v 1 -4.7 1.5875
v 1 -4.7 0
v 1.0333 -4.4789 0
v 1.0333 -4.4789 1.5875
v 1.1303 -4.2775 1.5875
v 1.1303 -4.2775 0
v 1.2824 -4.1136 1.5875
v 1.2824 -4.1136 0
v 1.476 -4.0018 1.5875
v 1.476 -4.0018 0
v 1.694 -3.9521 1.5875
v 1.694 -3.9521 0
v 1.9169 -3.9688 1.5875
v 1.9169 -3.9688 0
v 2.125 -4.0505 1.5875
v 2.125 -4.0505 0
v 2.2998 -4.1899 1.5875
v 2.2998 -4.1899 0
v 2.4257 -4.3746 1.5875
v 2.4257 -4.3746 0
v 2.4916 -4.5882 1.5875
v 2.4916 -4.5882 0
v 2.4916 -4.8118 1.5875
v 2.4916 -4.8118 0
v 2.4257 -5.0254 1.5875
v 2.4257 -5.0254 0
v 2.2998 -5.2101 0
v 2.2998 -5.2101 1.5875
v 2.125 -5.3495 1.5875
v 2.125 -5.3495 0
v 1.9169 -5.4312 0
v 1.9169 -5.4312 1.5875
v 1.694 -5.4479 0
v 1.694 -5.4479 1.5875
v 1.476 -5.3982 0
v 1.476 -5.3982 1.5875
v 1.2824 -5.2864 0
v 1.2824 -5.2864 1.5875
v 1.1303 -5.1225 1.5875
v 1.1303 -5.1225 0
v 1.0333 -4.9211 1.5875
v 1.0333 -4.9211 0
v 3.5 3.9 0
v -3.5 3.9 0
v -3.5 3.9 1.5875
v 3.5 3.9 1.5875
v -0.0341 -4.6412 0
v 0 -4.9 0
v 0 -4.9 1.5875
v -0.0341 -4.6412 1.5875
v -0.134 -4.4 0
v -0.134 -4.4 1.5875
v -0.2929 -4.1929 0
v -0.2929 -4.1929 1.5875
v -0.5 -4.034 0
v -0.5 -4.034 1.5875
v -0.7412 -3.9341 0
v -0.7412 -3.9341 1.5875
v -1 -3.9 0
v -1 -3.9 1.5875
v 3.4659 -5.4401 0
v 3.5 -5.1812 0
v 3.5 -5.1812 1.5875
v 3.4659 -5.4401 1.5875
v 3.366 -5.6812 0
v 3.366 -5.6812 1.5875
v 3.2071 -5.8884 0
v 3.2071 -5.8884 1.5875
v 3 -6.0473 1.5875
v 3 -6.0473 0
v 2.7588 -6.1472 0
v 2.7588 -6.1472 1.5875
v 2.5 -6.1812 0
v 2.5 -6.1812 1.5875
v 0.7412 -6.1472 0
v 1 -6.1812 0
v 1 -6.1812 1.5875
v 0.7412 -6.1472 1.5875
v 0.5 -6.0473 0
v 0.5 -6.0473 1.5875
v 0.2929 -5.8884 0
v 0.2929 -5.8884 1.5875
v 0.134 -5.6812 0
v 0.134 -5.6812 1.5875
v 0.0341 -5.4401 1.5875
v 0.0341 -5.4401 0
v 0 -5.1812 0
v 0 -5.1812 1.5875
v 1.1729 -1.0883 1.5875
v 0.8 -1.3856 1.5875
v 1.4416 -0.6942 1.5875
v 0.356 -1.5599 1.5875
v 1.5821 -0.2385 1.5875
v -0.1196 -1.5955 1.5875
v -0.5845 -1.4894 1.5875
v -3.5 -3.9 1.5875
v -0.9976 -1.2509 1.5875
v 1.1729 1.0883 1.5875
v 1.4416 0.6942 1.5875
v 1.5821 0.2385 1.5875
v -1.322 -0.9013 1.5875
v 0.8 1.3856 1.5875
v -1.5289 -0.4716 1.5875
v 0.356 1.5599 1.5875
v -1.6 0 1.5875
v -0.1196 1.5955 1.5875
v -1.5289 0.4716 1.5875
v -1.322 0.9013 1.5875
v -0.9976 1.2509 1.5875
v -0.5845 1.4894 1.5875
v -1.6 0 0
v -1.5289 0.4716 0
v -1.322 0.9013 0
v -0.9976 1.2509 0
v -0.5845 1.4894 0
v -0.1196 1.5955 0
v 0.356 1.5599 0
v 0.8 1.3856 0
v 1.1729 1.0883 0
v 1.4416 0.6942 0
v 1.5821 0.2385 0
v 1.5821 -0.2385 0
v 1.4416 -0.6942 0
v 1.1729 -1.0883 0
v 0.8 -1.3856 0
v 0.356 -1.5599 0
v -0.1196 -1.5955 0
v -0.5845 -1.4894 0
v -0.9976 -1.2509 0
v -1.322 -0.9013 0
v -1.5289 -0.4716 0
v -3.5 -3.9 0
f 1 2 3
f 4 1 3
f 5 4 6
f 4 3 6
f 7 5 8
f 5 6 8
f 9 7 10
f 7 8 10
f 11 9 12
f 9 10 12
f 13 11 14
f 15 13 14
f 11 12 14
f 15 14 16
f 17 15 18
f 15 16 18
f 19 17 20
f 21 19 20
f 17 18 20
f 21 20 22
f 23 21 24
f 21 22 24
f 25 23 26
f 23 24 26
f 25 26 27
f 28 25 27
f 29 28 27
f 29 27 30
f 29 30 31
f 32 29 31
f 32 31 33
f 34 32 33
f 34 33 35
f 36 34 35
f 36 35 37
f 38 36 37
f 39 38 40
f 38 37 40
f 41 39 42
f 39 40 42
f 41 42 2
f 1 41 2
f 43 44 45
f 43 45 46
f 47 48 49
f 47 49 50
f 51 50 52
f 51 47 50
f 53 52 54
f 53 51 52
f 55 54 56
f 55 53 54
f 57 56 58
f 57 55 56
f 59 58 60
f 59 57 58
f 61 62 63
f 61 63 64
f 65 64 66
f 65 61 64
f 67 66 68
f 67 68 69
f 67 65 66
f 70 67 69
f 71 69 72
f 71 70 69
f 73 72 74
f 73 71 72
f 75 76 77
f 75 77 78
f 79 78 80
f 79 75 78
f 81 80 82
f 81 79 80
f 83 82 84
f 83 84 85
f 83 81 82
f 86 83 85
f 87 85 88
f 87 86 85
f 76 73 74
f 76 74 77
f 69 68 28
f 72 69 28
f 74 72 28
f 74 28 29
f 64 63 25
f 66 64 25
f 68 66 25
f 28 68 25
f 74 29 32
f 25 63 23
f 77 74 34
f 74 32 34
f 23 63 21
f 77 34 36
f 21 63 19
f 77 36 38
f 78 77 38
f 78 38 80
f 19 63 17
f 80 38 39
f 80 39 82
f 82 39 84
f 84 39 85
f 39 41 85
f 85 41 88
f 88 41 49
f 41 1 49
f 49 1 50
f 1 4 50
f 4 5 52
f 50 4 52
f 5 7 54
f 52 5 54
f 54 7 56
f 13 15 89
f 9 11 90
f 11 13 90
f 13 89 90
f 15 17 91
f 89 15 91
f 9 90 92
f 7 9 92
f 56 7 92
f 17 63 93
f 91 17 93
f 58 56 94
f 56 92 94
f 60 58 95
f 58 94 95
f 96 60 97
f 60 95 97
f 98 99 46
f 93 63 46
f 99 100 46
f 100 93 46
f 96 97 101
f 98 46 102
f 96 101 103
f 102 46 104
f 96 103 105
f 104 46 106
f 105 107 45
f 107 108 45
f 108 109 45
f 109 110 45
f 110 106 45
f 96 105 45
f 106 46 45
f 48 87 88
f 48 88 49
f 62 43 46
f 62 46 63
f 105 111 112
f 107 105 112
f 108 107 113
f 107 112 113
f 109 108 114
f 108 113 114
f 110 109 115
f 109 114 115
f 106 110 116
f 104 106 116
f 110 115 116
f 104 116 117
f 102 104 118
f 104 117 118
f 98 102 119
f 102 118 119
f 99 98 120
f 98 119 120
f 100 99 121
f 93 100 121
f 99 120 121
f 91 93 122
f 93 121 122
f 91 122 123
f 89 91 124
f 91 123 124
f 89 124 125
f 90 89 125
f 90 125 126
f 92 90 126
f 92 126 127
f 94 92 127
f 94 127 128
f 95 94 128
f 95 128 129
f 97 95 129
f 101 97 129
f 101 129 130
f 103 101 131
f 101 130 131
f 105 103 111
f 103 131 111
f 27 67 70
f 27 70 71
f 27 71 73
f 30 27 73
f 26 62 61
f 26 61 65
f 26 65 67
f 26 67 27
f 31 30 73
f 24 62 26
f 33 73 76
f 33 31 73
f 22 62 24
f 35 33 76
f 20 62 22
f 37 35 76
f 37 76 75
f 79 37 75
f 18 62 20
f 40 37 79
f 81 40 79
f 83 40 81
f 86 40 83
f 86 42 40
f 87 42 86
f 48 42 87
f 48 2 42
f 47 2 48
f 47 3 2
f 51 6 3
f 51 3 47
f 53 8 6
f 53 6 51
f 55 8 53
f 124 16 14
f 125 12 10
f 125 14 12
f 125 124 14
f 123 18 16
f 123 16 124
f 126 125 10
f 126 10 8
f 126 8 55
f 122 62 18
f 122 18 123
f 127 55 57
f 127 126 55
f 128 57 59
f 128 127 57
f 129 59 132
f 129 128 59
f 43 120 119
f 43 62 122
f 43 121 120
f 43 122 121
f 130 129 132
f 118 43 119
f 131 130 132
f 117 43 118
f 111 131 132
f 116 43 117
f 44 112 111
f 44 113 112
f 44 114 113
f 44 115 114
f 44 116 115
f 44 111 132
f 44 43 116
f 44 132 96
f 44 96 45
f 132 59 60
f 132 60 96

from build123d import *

# Parameters (mm, degrees)
SKETCH1_R           = 0.75
SKETCH1_R_2         = 1.6
BOSS_EXTRUDE1_DEPTH = 1.5875


with BuildPart() as part:
    # Sketch1 → Boss-Extrude1 (new body)
    with BuildSketch(Plane(origin=(0, 0, 0), x_dir=(-1, 0, 0), z_dir=(0, 0, -1))):
        with BuildLine():
            Line((3.5, -3.9), (3.5, 3.9))
            Line((3.5, 3.9), (-3.5, 3.9))
            Line((-3.5, 3.9), (-3.5, -5.18125))
            ThreePointArc((-3.5, -5.18125), (-3.207106781, -5.888356781), (-2.5, -6.18125))
            Line((-2.5, -6.18125), (-1, -6.18125))
            ThreePointArc((-1, -6.18125), (-0.292893219, -5.888356781), (0, -5.18125))
            Line((0, -5.18125), (0, -4.9))
            ThreePointArc((0, -4.9), (0.292893219, -4.192893219), (1, -3.9))
            Line((1, -3.9), (3.5, -3.9))
        make_face()
        with Locations((-1.75, -4.7)):
            Circle(SKETCH1_R, mode=Mode.SUBTRACT)
        Circle(SKETCH1_R_2, mode=Mode.SUBTRACT)
    extrude(amount=-BOSS_EXTRUDE1_DEPTH)


solid = part.part
